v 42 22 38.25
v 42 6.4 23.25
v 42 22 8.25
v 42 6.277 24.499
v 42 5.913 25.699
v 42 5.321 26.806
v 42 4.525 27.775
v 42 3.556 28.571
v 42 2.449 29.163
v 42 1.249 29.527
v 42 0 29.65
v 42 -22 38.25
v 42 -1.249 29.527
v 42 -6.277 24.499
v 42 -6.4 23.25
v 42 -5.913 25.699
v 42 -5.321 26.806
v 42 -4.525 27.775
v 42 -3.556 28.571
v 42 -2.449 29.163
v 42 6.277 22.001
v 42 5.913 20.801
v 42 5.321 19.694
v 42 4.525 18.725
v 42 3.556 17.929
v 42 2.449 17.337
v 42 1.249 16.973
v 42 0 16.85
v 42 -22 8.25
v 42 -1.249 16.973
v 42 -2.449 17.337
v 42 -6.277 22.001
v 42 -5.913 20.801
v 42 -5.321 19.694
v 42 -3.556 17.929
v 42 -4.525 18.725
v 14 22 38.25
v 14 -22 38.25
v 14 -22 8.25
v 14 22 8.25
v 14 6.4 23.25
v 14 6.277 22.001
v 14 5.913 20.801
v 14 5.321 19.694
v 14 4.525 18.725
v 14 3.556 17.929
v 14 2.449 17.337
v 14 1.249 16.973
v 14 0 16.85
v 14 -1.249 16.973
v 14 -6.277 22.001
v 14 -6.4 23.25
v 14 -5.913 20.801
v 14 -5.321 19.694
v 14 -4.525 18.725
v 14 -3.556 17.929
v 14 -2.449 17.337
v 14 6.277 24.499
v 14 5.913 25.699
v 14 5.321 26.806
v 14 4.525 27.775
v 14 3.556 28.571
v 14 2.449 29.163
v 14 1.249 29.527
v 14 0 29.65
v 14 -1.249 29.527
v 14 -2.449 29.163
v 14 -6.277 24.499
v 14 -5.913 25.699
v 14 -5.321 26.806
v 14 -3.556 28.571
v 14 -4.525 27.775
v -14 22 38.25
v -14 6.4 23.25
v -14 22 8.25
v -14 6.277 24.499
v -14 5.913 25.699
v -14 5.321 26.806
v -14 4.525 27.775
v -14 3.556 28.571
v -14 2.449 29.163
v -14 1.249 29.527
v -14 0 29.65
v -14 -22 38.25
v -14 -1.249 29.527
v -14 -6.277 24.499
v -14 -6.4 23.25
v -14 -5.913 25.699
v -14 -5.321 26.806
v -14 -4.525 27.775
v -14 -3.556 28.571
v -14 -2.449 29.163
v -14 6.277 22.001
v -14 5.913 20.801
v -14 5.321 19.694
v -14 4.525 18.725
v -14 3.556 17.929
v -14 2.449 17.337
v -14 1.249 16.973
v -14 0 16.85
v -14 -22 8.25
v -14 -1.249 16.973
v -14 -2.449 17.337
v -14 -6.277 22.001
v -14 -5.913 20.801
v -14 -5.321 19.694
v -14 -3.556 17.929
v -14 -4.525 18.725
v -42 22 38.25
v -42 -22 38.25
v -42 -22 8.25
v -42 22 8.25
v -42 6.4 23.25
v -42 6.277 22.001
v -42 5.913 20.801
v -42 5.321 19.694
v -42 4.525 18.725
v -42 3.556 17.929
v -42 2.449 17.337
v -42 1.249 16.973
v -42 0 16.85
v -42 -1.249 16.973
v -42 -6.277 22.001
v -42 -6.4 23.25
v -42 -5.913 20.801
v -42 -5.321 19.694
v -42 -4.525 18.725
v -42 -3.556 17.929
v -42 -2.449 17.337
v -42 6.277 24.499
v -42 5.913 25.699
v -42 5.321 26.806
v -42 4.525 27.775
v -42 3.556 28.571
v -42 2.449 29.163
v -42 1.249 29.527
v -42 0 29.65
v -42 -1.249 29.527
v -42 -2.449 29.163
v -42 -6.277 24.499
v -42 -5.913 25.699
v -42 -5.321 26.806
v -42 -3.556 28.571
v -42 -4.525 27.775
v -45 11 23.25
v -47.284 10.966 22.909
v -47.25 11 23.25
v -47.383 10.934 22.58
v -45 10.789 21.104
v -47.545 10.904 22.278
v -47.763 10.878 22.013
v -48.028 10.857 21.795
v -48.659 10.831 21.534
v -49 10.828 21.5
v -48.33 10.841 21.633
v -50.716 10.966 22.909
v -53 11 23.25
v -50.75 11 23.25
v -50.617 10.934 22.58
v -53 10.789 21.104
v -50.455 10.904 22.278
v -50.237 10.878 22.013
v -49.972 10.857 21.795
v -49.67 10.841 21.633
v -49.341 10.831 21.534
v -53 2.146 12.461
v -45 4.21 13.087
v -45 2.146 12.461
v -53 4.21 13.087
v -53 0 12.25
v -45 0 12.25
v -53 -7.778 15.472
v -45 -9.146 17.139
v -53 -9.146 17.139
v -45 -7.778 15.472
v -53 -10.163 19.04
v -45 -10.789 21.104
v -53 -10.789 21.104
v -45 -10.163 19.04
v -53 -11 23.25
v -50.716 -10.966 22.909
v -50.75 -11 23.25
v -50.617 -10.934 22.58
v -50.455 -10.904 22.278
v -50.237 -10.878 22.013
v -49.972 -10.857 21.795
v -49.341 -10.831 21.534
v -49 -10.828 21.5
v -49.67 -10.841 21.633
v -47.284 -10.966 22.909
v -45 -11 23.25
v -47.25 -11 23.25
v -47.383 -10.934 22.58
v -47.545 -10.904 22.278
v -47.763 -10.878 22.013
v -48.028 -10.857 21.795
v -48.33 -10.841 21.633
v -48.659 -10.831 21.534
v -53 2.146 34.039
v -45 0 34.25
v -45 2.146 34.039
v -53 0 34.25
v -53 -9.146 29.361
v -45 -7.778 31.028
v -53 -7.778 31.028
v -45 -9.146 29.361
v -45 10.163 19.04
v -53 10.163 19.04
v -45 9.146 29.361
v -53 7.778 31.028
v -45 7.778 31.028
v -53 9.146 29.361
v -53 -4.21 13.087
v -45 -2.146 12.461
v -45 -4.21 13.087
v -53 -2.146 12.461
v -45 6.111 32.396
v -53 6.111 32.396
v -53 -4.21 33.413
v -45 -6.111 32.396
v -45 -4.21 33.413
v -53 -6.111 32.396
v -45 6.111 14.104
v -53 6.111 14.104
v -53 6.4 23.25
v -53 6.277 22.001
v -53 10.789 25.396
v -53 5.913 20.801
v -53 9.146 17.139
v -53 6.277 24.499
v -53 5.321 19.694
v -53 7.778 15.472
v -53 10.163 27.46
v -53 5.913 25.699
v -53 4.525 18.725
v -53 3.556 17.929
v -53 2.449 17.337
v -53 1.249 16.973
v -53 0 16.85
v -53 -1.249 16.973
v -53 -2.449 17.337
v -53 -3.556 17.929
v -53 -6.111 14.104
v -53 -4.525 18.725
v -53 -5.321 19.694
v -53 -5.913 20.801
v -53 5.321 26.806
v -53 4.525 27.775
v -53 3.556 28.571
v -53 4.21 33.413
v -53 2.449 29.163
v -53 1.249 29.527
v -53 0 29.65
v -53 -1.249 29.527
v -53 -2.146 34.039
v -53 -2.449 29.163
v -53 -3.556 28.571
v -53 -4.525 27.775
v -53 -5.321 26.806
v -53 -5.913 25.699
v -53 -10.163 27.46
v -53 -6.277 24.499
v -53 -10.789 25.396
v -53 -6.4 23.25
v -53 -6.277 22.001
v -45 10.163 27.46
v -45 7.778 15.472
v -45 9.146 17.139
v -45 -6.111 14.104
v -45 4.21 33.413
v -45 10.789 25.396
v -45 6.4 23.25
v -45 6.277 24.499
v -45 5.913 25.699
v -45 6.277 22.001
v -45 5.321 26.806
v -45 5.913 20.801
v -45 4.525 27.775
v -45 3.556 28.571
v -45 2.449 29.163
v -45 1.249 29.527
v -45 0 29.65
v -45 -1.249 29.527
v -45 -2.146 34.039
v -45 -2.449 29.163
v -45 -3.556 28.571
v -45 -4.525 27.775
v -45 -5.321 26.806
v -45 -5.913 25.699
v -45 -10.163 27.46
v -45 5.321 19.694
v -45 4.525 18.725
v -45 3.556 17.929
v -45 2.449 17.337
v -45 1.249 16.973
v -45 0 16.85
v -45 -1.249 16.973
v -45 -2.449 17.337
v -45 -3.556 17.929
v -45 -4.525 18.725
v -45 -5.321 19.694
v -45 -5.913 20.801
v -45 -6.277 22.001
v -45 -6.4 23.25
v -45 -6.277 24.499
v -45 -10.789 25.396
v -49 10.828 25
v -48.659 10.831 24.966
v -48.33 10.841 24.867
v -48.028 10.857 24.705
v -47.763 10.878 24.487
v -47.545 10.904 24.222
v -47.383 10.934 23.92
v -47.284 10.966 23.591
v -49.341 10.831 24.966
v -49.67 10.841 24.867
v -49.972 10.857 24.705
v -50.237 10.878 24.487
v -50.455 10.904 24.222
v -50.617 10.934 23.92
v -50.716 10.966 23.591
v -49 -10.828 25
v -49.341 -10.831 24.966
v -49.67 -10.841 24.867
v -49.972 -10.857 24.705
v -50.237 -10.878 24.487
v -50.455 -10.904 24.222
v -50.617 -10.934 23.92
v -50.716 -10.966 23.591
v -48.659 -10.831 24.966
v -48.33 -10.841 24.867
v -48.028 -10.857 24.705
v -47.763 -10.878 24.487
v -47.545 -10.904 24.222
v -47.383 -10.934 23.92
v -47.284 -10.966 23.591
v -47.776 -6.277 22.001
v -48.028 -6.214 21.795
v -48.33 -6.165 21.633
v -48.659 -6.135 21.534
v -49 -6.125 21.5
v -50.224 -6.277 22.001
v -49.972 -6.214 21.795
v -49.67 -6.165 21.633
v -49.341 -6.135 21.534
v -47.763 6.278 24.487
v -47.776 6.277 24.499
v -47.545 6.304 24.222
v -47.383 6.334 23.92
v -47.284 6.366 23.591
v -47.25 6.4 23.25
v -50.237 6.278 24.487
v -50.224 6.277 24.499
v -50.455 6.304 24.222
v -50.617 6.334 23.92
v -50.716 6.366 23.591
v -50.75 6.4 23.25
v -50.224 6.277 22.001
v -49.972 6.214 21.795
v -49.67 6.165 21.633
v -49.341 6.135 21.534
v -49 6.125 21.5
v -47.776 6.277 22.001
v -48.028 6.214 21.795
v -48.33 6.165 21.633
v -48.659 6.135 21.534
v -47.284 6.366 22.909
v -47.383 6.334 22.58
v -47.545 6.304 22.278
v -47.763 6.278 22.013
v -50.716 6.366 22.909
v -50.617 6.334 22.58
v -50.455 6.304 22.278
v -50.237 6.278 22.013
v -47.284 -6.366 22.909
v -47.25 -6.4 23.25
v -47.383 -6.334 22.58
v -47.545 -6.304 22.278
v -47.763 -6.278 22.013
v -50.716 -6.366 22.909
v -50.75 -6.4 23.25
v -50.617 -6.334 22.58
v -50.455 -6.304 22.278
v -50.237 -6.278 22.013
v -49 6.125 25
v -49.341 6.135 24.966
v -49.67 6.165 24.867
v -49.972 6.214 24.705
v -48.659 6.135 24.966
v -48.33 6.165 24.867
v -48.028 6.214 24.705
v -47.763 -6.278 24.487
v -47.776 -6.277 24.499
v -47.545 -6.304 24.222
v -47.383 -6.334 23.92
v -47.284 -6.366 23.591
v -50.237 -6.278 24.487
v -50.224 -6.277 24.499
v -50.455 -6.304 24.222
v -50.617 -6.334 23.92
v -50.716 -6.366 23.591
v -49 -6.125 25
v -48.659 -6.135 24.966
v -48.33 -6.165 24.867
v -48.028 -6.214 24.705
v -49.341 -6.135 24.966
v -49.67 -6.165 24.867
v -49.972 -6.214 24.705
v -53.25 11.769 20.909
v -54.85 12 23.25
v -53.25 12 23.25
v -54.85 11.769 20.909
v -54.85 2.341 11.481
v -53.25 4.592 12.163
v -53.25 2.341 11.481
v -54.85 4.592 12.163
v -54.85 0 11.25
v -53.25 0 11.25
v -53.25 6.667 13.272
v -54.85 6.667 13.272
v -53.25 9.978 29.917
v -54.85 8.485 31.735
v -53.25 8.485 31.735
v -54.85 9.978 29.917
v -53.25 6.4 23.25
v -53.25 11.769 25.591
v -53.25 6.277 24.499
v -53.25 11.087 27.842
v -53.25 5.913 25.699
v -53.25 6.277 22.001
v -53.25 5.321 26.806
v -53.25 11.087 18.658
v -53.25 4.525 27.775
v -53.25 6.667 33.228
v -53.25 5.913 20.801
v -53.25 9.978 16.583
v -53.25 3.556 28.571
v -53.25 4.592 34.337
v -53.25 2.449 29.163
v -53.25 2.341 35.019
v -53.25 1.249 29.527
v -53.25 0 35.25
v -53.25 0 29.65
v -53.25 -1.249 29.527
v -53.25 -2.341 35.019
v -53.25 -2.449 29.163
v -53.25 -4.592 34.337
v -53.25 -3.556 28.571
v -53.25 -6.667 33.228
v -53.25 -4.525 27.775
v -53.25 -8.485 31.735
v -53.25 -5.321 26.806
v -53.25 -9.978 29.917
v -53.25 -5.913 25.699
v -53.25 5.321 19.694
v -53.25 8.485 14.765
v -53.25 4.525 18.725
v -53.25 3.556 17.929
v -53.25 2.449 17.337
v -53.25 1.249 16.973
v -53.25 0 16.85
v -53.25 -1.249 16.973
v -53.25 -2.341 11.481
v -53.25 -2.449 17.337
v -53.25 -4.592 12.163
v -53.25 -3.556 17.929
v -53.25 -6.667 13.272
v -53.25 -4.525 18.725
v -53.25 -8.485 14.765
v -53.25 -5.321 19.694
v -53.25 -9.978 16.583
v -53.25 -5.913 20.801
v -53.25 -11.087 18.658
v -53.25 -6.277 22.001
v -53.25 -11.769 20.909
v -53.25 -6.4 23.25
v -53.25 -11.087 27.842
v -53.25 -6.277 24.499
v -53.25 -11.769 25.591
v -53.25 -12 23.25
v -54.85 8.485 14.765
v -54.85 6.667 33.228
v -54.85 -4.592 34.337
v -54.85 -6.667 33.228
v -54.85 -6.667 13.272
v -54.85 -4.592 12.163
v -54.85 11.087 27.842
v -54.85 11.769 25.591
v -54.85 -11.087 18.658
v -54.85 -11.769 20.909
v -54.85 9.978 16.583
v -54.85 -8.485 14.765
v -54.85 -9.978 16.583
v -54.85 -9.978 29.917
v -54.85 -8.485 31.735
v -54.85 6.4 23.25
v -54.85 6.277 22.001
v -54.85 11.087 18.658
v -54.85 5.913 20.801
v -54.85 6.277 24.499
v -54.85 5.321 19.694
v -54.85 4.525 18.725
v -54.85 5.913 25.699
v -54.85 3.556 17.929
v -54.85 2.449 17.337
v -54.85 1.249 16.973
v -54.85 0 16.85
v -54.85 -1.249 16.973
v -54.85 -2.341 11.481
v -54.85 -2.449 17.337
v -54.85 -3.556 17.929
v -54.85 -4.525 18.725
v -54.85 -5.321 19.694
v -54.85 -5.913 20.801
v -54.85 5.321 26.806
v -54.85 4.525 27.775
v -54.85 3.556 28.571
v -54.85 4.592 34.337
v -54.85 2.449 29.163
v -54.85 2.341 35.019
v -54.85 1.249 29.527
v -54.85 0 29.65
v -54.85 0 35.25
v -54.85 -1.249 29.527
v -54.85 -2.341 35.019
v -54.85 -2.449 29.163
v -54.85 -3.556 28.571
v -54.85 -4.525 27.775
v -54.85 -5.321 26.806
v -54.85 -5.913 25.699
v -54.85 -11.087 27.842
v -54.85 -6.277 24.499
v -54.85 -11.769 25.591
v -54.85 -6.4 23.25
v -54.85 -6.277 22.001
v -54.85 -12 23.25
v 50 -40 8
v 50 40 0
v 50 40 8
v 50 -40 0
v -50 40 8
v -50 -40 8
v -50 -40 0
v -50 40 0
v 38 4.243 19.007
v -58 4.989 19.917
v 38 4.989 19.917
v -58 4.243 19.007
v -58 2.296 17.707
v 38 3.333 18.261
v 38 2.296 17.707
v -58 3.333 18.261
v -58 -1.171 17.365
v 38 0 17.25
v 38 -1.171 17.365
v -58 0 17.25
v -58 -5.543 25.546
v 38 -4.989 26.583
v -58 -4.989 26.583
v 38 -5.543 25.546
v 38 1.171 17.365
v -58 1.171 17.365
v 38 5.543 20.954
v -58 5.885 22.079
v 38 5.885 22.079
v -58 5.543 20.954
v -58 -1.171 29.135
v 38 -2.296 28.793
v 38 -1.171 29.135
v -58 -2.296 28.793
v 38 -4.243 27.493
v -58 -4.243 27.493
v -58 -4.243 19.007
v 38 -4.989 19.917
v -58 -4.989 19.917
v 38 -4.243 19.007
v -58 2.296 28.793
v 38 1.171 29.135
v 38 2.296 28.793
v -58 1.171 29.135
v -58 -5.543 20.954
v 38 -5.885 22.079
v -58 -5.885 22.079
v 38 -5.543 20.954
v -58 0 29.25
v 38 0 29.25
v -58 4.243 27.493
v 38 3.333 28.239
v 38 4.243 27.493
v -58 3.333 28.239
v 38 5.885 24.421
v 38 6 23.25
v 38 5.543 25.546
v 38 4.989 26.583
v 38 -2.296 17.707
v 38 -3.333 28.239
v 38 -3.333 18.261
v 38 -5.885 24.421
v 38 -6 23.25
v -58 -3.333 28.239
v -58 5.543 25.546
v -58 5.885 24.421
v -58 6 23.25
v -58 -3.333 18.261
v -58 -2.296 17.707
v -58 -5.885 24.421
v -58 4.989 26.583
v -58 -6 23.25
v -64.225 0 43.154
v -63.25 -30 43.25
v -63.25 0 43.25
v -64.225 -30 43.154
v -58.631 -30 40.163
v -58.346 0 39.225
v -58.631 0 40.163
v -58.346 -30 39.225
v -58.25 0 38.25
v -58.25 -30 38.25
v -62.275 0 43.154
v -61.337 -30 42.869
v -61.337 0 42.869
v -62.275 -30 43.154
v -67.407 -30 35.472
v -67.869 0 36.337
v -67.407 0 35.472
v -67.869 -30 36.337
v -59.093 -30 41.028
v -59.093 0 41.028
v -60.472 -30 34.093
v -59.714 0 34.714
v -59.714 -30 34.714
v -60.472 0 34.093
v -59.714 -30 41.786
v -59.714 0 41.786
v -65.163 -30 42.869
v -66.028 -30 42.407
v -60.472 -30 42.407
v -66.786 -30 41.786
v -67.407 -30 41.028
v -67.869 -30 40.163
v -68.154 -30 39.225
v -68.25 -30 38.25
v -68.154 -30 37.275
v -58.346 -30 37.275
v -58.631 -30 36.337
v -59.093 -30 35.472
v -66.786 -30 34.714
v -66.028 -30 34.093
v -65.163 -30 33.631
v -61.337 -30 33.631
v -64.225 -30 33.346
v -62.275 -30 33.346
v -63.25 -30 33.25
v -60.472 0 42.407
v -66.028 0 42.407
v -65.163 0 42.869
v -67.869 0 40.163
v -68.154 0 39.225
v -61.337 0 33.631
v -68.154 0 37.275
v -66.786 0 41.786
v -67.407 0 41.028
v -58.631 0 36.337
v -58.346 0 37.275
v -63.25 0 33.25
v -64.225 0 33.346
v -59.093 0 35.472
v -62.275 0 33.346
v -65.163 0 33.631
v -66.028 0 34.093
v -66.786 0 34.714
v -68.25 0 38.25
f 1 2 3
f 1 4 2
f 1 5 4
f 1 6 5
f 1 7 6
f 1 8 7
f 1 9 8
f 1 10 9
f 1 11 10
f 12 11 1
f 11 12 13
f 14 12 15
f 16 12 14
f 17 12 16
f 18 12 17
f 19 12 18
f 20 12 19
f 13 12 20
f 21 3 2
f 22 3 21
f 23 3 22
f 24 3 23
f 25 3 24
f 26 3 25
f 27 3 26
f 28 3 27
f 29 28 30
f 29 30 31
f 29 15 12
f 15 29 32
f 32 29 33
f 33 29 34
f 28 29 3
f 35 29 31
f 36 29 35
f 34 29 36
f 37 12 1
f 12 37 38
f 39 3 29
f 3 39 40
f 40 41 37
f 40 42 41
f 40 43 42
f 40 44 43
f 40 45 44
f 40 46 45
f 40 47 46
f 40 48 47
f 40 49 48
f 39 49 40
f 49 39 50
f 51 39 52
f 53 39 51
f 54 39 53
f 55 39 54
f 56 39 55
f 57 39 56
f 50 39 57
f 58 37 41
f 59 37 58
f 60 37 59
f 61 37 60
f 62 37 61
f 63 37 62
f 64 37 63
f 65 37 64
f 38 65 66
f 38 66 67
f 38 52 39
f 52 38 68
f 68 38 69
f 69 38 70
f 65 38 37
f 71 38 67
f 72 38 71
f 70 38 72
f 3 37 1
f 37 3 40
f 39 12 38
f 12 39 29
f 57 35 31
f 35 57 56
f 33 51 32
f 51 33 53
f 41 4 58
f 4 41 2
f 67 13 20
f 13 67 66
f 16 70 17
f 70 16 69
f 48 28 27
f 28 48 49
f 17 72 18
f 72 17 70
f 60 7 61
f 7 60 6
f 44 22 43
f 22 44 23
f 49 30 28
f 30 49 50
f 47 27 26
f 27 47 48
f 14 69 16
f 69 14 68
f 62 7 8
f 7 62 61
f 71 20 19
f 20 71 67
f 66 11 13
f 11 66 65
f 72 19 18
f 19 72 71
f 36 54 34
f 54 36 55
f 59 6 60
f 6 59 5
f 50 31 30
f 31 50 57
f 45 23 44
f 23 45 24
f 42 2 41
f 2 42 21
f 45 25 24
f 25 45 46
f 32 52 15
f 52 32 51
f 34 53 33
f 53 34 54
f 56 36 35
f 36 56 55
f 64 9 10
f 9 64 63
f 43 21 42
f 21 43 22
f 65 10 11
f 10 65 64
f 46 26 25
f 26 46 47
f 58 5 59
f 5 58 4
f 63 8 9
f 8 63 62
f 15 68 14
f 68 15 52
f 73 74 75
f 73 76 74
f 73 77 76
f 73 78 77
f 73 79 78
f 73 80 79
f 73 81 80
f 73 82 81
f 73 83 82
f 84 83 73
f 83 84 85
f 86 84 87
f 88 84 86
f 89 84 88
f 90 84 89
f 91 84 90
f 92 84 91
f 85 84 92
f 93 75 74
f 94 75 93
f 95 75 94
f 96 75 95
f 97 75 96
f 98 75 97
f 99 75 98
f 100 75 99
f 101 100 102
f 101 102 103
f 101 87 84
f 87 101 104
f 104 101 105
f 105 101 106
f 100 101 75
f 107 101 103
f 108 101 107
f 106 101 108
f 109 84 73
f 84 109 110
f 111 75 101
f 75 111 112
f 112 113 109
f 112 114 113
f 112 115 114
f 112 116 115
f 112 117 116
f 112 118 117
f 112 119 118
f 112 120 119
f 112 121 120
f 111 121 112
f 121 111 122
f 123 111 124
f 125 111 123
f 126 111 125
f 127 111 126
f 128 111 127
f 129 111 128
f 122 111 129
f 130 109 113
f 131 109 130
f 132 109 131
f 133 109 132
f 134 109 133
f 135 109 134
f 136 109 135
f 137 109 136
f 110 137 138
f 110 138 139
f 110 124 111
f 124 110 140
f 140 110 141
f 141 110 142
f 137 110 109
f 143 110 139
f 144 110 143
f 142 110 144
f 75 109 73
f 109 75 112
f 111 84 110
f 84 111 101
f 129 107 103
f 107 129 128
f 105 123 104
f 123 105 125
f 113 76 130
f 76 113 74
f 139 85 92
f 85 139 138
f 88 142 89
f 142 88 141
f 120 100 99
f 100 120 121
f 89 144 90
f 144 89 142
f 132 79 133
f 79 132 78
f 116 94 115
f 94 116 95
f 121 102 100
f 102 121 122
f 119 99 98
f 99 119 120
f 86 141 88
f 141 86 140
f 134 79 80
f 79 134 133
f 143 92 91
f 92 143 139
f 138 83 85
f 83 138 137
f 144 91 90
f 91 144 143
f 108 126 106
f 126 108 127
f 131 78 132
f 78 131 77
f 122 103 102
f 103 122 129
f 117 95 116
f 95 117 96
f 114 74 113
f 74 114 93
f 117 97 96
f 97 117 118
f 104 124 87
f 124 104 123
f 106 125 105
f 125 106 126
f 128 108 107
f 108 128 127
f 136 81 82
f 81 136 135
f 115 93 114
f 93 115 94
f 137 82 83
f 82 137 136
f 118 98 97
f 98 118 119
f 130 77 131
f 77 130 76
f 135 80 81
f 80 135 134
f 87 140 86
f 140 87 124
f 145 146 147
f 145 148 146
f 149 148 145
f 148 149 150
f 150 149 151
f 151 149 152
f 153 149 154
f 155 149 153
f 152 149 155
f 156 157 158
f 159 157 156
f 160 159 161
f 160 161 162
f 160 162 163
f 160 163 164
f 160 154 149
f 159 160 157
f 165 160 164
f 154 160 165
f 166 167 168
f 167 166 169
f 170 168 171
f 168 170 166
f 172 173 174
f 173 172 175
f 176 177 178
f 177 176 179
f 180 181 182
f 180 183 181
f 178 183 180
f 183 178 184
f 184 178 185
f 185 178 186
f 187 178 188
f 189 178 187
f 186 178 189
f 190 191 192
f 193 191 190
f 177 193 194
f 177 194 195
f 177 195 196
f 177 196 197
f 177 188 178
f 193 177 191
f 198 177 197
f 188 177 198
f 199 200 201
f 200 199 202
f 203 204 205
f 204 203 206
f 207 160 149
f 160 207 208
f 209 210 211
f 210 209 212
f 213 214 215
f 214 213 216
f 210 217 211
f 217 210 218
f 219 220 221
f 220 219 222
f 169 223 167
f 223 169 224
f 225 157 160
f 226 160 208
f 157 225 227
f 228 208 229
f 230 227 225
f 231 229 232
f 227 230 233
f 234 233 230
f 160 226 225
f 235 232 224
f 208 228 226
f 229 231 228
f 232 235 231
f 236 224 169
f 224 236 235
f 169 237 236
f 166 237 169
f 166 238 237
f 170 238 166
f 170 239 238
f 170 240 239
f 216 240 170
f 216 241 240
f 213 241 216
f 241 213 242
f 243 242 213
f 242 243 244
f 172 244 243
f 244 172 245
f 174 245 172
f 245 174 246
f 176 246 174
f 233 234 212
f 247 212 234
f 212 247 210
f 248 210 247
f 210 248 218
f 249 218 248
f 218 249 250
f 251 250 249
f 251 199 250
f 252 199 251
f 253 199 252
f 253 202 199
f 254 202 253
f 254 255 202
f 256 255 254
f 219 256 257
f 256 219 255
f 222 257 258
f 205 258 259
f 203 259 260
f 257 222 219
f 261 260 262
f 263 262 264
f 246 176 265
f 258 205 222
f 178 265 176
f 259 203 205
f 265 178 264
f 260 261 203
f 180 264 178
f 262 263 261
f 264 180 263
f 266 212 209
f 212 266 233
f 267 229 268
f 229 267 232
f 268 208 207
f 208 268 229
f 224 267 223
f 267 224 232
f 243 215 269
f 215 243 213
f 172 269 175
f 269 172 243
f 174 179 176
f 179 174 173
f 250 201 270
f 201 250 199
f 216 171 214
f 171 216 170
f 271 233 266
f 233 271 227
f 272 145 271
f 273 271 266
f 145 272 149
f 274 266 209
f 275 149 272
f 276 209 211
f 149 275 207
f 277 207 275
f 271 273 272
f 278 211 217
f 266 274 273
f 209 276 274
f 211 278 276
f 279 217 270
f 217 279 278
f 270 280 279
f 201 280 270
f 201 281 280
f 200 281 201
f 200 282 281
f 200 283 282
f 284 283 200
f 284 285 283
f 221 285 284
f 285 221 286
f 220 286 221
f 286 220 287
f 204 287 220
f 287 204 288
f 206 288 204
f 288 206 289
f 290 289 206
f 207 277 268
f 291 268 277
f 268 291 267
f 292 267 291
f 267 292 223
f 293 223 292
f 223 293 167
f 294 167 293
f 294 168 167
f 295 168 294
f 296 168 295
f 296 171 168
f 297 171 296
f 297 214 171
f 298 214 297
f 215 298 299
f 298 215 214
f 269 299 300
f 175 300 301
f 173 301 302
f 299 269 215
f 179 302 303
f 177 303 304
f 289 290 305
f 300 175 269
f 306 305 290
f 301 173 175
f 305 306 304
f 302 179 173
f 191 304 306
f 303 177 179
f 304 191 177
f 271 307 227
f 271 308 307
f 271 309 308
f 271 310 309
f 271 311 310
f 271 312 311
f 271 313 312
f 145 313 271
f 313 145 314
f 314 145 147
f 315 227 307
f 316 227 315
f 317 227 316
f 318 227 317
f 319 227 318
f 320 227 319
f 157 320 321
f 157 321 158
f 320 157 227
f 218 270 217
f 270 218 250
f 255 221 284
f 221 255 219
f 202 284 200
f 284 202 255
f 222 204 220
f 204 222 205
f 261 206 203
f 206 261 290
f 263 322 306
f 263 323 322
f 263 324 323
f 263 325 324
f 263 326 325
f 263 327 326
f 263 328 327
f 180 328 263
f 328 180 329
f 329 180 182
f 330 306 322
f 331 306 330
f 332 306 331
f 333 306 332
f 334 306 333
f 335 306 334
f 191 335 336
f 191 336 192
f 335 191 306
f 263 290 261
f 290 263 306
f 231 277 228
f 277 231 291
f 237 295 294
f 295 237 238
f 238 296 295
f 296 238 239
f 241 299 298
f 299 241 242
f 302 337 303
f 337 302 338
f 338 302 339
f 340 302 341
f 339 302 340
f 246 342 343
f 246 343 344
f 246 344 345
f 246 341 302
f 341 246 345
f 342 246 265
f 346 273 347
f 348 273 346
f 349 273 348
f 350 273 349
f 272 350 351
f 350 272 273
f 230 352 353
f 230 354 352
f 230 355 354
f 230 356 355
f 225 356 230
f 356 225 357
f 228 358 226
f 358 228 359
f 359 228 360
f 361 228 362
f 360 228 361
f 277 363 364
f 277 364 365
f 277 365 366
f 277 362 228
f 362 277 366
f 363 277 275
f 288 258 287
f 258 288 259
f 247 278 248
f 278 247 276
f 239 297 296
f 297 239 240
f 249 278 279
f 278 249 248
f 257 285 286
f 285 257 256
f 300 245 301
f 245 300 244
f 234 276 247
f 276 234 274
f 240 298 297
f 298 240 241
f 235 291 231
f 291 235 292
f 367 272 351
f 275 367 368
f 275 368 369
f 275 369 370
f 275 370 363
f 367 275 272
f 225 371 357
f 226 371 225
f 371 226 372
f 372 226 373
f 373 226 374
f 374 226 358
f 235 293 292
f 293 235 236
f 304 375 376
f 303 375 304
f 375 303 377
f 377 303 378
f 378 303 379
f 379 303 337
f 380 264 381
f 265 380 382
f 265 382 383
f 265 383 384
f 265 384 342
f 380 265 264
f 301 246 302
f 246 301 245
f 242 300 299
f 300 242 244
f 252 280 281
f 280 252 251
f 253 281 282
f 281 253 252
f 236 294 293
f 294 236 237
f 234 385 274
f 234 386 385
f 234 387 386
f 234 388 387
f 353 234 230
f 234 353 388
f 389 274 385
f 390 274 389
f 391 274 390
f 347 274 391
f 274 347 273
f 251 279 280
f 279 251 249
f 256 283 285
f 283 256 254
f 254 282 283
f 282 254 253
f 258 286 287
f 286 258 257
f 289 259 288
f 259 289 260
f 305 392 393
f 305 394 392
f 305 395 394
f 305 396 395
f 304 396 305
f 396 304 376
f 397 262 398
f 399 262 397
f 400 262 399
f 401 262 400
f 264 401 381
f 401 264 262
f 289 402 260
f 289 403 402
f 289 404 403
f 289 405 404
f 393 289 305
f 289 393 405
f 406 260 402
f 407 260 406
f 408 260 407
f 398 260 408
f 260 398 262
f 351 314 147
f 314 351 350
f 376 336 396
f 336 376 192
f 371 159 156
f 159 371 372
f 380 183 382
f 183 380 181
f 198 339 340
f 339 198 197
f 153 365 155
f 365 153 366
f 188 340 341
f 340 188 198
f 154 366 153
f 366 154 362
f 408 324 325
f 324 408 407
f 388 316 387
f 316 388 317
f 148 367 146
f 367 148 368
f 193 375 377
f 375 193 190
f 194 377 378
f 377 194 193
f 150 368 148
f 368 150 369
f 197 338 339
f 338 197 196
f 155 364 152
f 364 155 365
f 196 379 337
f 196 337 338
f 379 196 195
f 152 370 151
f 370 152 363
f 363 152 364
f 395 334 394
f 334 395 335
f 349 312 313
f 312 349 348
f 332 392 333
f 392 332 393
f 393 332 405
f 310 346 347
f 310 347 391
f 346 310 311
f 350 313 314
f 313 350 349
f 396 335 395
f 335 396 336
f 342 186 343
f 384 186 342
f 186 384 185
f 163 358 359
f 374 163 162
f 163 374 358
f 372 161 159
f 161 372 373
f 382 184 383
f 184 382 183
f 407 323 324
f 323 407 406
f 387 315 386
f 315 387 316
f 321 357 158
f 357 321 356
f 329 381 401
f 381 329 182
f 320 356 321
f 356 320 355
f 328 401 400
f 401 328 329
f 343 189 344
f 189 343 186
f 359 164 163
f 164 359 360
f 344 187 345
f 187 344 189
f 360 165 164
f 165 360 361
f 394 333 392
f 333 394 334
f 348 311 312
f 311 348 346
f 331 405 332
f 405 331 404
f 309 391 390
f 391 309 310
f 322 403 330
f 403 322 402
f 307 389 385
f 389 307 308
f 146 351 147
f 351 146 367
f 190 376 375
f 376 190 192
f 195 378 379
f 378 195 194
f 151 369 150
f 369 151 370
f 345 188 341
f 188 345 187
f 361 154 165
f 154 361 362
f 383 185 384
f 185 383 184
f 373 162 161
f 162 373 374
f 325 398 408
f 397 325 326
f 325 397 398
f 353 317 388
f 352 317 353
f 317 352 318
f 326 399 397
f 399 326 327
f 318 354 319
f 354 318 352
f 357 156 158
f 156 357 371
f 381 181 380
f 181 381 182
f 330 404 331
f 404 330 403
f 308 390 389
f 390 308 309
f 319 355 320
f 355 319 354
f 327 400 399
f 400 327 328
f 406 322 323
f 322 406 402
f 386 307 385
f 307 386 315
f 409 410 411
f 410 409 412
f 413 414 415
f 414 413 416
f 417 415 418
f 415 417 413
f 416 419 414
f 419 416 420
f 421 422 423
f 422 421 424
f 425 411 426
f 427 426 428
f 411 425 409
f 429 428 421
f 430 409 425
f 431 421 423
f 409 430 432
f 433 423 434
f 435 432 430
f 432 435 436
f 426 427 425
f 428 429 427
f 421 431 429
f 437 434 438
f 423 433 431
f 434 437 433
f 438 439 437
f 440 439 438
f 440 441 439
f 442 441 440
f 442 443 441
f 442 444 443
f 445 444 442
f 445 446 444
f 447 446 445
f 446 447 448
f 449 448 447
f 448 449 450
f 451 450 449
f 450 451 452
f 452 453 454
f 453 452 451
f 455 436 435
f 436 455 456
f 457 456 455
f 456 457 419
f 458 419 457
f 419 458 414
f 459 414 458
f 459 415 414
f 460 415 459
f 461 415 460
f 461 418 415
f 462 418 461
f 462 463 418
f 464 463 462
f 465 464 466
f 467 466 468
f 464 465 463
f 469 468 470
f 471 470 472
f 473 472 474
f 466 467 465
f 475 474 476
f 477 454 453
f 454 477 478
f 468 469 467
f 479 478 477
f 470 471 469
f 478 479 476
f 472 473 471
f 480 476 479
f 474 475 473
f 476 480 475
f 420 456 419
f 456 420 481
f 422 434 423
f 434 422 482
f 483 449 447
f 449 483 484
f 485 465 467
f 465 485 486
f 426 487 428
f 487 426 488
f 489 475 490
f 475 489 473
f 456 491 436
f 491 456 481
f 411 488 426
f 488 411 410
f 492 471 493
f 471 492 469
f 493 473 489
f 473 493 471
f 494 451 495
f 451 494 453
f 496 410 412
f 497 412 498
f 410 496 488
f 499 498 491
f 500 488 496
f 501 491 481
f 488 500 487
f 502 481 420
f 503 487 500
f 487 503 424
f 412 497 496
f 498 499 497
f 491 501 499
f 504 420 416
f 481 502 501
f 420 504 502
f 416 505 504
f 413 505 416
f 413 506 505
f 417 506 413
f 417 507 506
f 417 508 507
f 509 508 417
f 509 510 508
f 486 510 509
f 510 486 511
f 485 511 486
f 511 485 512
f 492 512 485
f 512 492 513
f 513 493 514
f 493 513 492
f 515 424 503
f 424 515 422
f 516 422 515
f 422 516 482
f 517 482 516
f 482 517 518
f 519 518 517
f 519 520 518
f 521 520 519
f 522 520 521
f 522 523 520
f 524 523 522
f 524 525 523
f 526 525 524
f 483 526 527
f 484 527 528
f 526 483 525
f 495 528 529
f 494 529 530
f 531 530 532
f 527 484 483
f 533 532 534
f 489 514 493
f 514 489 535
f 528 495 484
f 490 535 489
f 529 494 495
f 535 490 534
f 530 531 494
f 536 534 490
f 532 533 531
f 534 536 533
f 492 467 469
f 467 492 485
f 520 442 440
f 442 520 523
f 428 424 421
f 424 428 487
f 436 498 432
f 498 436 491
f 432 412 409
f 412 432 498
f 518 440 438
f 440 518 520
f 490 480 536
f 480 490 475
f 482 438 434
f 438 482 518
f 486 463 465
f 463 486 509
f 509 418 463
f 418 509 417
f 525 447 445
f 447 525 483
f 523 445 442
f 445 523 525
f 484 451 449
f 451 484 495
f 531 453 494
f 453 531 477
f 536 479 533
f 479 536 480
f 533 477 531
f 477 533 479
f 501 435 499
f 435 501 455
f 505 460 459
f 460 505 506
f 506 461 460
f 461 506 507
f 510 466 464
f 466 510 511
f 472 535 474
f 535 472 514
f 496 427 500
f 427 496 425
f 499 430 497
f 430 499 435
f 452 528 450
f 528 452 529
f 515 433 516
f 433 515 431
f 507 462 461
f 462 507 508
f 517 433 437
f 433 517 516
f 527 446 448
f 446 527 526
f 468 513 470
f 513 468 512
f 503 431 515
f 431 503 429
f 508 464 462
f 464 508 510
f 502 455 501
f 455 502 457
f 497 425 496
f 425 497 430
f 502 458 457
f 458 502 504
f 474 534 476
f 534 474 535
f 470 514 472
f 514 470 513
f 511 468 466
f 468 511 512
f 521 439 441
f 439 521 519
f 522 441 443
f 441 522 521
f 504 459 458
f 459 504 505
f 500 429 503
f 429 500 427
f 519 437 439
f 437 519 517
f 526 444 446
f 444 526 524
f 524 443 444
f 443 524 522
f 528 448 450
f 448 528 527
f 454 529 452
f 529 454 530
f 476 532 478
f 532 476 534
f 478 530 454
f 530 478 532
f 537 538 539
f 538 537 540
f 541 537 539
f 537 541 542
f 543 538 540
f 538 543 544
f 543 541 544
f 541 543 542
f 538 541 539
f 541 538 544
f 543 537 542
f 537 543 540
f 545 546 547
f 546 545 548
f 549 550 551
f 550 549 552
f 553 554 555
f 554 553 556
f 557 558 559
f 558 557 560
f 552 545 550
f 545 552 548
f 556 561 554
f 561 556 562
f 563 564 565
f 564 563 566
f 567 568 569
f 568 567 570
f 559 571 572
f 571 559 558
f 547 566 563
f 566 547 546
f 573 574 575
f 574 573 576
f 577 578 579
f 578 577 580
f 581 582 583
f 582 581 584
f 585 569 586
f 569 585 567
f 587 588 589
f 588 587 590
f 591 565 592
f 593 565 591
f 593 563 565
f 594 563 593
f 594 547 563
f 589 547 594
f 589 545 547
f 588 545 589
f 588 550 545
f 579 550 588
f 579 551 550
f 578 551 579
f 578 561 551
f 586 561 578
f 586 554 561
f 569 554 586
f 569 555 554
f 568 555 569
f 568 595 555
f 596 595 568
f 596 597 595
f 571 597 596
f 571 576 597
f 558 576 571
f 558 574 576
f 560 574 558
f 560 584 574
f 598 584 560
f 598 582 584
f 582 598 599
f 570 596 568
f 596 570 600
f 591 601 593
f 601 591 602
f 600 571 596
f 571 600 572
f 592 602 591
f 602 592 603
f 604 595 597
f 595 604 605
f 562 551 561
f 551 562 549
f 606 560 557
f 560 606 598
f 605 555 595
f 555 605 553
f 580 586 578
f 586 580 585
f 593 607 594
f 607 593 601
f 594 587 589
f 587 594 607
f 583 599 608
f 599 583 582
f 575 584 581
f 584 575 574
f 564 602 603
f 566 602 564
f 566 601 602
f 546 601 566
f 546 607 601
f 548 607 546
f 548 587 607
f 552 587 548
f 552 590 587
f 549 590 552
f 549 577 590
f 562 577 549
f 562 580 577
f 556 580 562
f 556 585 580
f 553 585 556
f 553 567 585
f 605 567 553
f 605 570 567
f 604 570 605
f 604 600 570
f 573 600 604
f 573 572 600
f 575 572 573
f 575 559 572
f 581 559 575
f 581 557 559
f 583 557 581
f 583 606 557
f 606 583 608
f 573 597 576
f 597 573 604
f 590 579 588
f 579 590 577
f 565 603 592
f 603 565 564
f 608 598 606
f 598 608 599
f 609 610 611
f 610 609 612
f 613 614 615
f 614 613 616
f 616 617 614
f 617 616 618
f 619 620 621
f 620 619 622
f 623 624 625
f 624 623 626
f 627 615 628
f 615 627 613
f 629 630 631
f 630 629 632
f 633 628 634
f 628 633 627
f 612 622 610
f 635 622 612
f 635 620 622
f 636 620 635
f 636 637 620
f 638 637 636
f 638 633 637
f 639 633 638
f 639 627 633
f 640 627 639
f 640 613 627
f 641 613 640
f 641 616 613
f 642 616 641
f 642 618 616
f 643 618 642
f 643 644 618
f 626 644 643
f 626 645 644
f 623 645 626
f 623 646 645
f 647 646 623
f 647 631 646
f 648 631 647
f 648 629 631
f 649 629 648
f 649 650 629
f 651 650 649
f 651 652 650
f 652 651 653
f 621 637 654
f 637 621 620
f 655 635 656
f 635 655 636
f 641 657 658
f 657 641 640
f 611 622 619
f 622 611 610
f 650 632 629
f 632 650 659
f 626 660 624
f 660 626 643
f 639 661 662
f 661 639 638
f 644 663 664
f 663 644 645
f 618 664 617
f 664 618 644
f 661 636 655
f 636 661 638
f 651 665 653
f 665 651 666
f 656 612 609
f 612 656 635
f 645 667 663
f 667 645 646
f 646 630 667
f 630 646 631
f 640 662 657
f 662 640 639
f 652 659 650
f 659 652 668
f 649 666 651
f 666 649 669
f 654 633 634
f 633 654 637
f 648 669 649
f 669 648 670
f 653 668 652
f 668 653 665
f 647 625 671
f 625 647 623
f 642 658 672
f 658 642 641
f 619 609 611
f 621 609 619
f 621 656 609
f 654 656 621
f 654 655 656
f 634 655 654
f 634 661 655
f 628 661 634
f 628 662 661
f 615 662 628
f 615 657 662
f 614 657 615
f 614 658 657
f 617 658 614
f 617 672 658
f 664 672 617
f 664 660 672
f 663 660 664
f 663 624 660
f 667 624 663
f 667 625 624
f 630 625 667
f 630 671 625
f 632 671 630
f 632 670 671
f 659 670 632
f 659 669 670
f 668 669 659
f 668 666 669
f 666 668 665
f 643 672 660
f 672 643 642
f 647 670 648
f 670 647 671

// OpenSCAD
$fn = 32;

// ------------------------------------------------------------------------
// Machine vise: screw d12, jaws 28 x 30 mm
// Every part is its own module, assembly() places every instance.
// ------------------------------------------------------------------------

// --- part 1 ---
module vise_bed() {
  difference() {
    translate([-50, -40, 0]) cube([100, 80, 8]);
  }
}

// --- part 2 ---
module vise_jaw() {
  difference() {
    translate([-14, -22, 0]) cube([28, 44, 30]);
    translate([0, 0, 15]) rotate([0, 90, 0]) cylinder(h = 30, d = 12.8, center = true);
  }
}

// --- part 3 ---
module vise_screw() {
  translate([0, 0, -48]) cylinder(h = 96, d = 12);
}

// --- part 4 ---
module screw_collar() {
  difference() {
    cylinder(h = 8, d = 22);
    translate([0, 0, -1]) cylinder(h = 10, d = 12.8);
    translate([0, 0, 4]) rotate([90, 0, 0]) cylinder(h = 24, d = 3.5, center = true);
  }
}

// --- part 5 ---
module screw_washer() {
  difference() {
      translate([0, 0, 0]) cylinder(h = 1.6, d = 24);
      translate([0, 0, -1]) cylinder(h = 3.6, d = 12.8);
    }
}

// --- part 6 ---
module vise_handle() {
  cylinder(h = 30, d = 10);
}

// --- assembly ---
module assembly() {
  color([0.80, 0.24, 0.20]) translate([0, 0, 0]) rotate([0, 0, 0]) vise_bed();
  color([0.20, 0.45, 0.75]) translate([28, 0, 8.25]) rotate([0, 0, 0]) vise_jaw();
  color([0.25, 0.62, 0.32]) translate([-28, 0, 8.25]) rotate([0, 0, 0]) vise_jaw();
  color([0.92, 0.70, 0.18]) translate([-10, 0, 23.25]) rotate([0, 90, 0]) vise_screw();
  color([0.58, 0.35, 0.70]) translate([-53, 0, 23.25]) rotate([0, 90, 0]) screw_collar();
  color([0.16, 0.66, 0.66]) translate([-54.85, 0, 23.25]) rotate([0, 90, 0]) screw_washer();
  color([0.85, 0.48, 0.18]) translate([-63.25, 0, 38.25]) rotate([90, 0, 0]) vise_handle();
}

assembly();
